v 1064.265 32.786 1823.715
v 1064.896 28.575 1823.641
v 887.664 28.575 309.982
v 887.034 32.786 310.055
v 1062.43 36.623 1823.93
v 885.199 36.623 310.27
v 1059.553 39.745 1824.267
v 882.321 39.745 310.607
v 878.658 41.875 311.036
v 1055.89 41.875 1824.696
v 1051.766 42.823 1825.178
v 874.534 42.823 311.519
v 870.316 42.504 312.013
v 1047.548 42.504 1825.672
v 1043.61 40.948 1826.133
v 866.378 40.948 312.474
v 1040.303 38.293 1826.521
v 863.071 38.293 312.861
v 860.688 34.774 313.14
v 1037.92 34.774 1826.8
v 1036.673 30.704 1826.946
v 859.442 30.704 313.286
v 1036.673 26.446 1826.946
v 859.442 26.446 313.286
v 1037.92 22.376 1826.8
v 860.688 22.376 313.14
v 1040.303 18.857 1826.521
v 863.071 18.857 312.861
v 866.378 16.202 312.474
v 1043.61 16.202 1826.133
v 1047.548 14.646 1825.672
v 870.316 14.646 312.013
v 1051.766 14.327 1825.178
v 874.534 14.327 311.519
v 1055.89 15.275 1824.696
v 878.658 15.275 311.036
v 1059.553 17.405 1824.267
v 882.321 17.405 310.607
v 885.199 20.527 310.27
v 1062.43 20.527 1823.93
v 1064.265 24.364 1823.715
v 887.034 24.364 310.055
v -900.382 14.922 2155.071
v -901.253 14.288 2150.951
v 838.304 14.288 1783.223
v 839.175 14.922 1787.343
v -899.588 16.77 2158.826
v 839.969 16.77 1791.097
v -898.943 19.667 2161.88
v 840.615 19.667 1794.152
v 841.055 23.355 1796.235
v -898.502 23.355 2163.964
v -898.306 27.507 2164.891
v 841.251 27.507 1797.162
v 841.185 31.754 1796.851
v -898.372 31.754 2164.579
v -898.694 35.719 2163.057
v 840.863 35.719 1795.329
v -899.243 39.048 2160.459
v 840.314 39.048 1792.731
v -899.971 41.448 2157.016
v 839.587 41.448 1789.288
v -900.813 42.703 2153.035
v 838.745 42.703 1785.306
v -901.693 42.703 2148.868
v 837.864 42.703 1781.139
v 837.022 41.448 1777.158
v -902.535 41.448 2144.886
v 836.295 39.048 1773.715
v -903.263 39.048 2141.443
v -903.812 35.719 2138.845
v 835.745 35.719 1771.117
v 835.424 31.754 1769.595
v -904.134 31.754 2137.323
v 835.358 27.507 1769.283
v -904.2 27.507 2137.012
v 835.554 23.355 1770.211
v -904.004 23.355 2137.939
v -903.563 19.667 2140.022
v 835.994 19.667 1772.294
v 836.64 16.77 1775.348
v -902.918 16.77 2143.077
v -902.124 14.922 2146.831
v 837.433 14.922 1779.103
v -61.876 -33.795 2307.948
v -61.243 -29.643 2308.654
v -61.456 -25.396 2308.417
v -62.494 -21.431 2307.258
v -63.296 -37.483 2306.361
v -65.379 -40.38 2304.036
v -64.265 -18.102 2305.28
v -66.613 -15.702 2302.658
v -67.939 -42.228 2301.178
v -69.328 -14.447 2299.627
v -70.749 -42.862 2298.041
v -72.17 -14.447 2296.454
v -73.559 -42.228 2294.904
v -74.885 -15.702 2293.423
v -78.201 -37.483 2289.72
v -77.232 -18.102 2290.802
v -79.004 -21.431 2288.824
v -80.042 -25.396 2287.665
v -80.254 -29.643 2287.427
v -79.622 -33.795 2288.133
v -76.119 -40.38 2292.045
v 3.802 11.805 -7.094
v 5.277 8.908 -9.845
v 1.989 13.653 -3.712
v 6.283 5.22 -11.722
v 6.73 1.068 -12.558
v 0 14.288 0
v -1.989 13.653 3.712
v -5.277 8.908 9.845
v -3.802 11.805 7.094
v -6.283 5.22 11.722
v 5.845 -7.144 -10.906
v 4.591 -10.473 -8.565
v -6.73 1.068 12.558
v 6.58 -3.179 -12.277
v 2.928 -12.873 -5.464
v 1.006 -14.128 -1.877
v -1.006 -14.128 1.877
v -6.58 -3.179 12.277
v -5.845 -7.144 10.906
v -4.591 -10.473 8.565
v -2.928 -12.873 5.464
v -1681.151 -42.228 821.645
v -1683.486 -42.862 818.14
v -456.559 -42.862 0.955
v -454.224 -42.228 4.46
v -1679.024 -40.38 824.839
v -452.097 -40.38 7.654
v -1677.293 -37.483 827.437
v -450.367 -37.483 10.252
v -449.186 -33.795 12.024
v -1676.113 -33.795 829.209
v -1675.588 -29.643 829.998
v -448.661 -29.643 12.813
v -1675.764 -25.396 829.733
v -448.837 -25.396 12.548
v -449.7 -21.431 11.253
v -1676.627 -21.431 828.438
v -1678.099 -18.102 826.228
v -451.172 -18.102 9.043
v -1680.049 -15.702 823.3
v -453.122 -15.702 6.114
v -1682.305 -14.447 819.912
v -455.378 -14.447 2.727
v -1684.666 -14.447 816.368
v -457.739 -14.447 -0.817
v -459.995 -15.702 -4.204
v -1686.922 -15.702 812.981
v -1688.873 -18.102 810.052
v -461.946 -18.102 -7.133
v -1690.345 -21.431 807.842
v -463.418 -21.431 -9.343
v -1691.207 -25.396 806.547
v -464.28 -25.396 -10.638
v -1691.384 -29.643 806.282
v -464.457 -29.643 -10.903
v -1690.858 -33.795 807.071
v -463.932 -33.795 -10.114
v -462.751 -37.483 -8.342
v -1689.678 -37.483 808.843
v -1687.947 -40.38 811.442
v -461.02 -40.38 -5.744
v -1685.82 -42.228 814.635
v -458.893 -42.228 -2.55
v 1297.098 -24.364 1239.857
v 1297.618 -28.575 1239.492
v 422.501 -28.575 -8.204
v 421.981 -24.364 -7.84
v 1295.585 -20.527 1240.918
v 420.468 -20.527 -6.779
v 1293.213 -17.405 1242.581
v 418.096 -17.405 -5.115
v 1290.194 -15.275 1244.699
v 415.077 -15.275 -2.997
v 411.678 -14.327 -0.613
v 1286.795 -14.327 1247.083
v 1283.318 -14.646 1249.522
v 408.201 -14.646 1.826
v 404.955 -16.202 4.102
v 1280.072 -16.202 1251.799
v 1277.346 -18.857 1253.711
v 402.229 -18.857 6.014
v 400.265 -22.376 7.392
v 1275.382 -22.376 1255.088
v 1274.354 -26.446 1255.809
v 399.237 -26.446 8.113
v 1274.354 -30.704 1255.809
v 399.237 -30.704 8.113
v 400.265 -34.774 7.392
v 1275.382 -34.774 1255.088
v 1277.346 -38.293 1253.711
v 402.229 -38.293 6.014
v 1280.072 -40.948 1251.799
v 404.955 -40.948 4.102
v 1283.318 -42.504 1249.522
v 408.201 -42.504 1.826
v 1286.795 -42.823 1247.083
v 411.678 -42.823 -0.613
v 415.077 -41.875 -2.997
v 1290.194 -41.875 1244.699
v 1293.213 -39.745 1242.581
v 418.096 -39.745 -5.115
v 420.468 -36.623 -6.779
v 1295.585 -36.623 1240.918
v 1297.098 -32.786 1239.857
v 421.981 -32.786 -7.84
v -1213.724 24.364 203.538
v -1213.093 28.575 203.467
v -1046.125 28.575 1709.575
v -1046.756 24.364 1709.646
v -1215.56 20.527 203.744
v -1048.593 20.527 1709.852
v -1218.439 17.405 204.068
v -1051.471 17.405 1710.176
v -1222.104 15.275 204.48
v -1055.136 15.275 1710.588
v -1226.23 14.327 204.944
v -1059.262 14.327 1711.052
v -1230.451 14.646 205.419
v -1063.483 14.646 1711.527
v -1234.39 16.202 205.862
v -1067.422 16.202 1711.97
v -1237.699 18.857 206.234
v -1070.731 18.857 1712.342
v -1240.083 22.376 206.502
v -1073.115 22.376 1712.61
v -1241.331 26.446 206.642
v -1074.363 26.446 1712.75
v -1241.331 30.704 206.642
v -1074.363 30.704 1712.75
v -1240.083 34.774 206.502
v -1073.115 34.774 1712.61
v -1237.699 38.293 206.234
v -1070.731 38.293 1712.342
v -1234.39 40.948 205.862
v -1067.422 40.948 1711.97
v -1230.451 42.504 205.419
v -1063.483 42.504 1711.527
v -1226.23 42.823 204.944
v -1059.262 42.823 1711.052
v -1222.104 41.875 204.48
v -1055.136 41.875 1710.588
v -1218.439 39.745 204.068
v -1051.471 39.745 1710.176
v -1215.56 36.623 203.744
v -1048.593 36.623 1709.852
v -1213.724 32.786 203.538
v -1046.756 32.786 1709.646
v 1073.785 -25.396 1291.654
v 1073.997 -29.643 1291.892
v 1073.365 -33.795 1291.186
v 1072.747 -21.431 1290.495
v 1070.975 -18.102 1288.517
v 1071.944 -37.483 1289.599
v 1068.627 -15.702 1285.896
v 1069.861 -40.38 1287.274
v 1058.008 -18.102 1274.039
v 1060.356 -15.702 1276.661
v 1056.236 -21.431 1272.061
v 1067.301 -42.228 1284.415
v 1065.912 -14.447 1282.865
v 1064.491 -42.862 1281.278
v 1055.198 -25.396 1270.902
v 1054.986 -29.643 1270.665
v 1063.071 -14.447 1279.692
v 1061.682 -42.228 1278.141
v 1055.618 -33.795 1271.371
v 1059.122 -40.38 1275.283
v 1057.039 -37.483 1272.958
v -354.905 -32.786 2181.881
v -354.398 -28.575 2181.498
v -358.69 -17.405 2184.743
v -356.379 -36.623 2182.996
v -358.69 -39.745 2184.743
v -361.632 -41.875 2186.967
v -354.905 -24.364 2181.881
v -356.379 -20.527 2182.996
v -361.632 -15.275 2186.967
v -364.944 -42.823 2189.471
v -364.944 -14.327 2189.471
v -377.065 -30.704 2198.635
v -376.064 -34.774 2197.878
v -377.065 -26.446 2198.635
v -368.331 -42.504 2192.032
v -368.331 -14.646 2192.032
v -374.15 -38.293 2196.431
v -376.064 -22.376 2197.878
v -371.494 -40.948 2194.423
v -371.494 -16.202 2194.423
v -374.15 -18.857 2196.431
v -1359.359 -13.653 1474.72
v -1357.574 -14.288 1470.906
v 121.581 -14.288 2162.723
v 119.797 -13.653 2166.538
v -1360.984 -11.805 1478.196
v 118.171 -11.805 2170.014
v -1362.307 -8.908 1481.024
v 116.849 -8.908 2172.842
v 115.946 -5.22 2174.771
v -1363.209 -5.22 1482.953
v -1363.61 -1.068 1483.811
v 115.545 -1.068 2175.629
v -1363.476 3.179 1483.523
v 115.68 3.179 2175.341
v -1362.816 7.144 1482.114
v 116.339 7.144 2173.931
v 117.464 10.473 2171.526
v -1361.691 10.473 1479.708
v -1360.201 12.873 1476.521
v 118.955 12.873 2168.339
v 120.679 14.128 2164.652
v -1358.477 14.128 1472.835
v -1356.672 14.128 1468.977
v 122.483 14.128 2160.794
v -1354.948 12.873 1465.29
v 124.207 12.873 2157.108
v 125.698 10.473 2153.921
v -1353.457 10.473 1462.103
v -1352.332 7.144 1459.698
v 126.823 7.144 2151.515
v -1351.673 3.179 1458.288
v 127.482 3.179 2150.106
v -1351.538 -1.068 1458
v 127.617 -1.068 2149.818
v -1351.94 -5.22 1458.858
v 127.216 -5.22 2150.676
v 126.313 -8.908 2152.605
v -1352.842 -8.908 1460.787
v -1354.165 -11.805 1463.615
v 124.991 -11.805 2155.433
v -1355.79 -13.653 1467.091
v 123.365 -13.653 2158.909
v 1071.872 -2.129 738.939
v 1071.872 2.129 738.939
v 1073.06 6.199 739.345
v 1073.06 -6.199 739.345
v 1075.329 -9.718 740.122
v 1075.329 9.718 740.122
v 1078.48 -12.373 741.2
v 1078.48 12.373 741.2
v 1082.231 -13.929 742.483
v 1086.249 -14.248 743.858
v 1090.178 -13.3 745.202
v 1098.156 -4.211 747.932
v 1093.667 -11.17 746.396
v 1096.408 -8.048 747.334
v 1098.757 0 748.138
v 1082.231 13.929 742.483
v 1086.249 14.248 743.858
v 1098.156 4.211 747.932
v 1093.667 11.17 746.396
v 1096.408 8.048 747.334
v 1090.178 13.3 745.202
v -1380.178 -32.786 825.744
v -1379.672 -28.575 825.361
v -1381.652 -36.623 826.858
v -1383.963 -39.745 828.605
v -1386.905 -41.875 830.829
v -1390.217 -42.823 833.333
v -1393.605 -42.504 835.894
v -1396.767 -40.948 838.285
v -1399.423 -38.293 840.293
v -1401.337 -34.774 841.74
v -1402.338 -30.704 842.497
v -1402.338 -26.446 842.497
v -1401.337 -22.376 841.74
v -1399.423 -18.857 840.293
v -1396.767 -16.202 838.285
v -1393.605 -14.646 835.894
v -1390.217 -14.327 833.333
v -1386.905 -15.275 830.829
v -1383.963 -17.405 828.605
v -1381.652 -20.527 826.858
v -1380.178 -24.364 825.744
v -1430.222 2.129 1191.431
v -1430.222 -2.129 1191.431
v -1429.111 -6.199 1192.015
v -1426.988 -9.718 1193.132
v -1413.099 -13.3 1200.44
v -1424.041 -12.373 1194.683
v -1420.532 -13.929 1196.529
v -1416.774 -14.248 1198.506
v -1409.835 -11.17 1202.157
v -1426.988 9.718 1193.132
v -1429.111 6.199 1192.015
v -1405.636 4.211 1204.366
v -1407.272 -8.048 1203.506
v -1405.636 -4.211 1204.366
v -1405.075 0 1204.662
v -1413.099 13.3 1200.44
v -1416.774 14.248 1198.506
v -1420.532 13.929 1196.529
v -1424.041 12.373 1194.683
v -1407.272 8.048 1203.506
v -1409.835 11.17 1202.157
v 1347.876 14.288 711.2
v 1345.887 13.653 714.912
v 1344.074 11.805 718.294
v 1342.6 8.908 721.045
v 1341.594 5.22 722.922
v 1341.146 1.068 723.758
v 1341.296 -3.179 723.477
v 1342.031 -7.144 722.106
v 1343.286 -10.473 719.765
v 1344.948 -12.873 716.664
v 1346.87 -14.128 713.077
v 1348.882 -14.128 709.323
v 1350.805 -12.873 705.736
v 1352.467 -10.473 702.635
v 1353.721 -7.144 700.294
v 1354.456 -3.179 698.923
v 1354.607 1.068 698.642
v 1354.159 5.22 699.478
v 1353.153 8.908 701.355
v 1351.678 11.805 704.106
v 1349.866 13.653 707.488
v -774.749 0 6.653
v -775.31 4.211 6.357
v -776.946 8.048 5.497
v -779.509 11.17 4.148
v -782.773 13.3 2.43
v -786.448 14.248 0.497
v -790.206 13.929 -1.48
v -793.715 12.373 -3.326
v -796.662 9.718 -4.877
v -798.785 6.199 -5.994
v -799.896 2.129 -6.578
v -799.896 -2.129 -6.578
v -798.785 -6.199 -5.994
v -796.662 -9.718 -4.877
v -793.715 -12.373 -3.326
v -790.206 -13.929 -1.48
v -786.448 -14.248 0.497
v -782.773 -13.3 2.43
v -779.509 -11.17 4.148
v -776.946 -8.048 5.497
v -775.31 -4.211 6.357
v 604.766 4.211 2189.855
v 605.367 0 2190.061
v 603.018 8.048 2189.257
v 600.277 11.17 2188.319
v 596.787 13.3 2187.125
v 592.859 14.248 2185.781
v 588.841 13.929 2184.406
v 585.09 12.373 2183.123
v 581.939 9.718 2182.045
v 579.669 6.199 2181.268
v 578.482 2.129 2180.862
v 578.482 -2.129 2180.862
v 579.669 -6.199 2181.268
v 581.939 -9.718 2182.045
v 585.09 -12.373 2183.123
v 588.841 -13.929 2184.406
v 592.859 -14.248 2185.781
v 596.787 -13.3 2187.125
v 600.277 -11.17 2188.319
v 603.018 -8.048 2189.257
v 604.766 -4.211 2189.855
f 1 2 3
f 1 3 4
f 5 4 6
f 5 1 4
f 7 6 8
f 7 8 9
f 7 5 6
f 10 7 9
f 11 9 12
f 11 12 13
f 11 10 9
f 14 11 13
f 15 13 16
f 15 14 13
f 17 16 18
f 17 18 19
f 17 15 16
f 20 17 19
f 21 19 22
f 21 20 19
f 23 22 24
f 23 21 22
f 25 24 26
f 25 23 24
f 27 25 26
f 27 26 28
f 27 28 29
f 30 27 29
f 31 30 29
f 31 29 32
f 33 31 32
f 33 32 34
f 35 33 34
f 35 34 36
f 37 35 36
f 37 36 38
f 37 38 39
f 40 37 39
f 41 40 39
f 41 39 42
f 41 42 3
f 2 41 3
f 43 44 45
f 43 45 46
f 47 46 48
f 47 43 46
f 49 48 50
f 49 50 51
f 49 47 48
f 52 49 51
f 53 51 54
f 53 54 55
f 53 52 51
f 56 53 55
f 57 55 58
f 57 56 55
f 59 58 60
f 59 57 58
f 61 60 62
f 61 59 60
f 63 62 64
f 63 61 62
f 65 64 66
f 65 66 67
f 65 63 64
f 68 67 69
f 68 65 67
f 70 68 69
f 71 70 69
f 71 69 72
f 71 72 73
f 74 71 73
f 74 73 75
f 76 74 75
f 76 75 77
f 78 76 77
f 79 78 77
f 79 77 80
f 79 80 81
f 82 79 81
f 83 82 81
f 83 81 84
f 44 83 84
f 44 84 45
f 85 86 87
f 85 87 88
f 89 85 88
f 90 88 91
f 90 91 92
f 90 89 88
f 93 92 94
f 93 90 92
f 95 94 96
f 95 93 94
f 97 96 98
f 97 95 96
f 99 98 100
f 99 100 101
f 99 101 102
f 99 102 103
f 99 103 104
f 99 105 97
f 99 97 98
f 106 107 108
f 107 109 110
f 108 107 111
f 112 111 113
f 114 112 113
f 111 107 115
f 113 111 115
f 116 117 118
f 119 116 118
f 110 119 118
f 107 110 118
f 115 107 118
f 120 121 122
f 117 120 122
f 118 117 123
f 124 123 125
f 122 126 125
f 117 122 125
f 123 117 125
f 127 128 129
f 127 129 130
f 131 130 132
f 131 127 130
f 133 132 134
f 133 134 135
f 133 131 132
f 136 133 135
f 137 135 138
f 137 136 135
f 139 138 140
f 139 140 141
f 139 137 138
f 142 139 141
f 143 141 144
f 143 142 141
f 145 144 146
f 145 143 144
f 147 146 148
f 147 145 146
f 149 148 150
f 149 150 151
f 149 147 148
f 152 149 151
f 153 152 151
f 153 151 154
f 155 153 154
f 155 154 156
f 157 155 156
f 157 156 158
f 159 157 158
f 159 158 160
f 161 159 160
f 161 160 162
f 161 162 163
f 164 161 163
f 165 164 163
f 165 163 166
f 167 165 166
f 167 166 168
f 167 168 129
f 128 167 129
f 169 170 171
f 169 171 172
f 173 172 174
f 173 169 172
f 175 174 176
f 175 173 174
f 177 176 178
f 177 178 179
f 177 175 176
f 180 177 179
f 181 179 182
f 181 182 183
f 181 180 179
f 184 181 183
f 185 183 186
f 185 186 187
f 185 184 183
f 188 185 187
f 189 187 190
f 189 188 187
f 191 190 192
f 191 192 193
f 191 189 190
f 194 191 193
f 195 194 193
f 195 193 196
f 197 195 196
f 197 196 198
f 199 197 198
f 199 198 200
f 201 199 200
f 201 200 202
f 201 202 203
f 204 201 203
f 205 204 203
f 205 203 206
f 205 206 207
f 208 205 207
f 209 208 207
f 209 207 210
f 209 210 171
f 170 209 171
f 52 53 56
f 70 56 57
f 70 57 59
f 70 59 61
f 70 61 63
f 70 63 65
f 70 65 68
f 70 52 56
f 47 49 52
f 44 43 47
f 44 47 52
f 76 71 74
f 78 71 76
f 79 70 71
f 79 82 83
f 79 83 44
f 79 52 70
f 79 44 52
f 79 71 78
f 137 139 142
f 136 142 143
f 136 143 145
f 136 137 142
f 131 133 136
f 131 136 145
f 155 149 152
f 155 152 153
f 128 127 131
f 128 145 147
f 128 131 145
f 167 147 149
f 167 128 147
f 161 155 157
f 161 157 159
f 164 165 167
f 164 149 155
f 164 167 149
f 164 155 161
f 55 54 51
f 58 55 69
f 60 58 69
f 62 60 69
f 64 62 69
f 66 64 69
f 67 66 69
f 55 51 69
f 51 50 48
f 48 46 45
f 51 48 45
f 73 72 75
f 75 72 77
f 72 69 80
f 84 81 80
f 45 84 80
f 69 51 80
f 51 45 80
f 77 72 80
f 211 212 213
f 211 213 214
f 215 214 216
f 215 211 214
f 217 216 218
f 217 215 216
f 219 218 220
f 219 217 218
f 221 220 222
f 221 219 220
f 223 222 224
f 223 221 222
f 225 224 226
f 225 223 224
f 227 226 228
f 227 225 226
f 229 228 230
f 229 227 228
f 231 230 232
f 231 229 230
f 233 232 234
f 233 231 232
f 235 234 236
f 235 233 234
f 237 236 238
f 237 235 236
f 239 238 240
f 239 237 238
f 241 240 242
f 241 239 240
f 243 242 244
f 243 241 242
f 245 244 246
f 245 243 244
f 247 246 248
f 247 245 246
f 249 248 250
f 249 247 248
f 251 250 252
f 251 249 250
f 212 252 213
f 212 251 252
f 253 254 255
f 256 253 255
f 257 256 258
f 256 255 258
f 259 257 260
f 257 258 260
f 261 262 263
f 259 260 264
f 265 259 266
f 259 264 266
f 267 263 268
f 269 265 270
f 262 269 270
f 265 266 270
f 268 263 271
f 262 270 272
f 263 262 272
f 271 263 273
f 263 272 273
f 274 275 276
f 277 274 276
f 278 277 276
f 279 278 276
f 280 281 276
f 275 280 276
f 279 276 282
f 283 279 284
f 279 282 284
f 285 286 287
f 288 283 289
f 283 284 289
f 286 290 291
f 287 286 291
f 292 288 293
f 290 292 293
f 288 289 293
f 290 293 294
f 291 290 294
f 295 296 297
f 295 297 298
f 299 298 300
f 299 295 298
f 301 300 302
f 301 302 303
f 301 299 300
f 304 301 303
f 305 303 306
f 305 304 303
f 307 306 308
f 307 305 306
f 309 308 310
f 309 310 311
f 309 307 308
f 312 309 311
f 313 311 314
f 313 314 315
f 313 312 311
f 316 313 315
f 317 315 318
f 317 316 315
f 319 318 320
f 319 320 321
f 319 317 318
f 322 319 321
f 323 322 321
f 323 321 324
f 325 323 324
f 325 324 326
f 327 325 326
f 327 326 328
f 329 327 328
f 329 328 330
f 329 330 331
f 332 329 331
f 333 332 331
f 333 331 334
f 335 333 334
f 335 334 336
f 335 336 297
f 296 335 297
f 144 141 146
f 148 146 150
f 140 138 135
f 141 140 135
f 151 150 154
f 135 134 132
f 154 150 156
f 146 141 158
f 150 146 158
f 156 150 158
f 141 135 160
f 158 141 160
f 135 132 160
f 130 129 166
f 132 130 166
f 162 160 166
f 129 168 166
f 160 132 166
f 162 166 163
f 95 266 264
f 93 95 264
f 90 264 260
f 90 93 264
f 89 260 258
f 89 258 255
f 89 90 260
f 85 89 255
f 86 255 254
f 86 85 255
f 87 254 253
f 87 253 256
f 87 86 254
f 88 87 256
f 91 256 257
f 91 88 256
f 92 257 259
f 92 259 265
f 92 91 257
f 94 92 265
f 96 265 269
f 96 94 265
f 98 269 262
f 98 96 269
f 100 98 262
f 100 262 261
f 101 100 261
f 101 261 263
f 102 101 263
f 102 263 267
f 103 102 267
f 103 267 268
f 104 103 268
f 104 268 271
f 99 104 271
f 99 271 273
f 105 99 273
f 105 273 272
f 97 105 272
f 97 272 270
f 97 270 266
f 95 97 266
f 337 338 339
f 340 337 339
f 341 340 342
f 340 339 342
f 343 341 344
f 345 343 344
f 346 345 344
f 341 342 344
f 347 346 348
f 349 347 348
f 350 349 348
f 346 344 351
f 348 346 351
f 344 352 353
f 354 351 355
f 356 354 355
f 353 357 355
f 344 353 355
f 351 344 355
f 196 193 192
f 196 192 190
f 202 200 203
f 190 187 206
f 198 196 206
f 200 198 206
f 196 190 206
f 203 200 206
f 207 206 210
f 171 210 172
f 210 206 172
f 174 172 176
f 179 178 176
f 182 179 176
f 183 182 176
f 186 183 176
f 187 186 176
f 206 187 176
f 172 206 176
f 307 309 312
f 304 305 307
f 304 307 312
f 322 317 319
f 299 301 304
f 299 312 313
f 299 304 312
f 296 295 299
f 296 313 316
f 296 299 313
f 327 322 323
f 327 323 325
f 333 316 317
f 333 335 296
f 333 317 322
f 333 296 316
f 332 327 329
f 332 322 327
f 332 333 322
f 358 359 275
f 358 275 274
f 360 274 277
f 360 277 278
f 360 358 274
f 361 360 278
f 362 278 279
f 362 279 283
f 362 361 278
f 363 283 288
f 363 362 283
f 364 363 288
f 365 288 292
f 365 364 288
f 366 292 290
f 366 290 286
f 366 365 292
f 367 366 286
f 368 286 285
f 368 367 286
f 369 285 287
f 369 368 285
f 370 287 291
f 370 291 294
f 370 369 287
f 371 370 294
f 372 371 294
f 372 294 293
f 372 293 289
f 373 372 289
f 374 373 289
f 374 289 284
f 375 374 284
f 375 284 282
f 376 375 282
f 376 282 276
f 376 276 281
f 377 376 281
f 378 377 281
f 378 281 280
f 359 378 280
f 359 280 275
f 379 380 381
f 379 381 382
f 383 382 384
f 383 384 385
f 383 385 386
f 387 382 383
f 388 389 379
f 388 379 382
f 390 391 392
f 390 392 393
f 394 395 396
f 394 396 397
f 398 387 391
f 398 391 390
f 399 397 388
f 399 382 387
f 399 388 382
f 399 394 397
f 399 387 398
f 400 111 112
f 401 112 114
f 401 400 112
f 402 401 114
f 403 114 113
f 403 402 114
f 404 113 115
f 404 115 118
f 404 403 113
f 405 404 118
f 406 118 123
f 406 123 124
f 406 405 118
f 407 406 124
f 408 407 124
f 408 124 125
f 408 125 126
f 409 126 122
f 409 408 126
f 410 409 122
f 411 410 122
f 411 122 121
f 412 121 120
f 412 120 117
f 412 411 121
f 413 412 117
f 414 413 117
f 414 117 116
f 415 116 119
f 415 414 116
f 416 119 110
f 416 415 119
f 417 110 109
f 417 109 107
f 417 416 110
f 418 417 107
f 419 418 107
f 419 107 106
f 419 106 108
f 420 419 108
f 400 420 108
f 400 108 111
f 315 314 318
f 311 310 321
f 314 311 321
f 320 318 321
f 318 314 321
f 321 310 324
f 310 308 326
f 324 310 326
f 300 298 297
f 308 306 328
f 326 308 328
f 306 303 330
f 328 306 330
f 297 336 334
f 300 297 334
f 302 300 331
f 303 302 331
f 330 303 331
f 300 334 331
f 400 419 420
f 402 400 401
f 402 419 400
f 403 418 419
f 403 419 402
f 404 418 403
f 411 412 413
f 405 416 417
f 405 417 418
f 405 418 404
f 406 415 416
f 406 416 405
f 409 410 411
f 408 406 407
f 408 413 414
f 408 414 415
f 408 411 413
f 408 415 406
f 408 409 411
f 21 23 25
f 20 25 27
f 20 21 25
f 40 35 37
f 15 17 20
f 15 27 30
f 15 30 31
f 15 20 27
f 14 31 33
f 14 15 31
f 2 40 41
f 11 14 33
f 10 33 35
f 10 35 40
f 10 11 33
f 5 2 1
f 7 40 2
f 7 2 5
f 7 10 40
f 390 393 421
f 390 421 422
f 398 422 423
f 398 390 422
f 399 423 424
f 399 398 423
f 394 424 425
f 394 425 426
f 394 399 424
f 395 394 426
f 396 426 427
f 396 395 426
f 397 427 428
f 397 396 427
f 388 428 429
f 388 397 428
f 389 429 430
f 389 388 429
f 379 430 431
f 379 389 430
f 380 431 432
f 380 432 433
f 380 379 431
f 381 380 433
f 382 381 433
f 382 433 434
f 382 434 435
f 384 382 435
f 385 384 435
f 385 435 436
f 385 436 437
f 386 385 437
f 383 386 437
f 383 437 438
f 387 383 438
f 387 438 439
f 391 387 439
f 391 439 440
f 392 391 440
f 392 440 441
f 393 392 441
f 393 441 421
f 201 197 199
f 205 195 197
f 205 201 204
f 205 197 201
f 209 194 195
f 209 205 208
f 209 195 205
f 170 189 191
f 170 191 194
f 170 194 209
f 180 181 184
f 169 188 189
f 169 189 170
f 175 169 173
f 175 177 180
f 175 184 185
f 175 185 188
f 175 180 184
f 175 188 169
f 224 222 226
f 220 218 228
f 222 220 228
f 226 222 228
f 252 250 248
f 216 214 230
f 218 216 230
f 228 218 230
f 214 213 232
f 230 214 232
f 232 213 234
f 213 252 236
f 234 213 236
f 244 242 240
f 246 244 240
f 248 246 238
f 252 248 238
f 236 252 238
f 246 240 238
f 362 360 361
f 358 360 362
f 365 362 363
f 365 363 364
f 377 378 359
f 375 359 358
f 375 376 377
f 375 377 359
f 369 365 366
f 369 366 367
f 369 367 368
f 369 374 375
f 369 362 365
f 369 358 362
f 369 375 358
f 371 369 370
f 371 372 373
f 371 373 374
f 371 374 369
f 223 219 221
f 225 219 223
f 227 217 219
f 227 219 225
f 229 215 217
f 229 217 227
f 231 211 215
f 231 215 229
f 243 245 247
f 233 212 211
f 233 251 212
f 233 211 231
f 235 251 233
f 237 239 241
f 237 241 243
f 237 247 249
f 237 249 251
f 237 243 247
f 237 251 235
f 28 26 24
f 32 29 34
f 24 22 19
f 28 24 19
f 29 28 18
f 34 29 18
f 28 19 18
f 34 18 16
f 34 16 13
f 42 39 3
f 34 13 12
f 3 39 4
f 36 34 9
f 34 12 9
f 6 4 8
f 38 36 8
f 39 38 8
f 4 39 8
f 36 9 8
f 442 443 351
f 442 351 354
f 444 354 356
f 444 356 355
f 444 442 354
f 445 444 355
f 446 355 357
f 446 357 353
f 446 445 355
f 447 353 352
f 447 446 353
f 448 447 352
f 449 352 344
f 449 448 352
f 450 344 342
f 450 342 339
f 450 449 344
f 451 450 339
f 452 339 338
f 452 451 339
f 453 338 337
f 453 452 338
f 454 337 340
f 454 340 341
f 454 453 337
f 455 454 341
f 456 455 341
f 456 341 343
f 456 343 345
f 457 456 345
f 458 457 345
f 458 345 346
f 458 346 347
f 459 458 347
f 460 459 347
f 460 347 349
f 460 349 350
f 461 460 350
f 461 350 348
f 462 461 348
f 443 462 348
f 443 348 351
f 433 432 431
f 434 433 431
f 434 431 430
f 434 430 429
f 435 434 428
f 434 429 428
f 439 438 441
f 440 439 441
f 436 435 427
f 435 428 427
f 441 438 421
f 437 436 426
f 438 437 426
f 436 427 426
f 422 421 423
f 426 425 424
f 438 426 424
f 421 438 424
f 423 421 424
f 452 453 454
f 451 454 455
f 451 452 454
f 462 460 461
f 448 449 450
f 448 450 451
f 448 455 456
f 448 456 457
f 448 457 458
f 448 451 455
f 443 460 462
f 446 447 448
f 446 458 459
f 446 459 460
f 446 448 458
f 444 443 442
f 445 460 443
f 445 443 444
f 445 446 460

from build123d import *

# Parameters (mm, degrees)
F3_R  = 14.2875
F9_R  = 14.2875
F13_R = 14.2875
F17_R = 14.2875
F21_R = 14.2875
F25_R = 14.2875
F29_R = 14.2875
F33_R = 14.2875
F37_R = 14.2875
F41_R = 14.2875
F45_R = 14.2875


with BuildPart() as f4:
    # F4: sweep along a path in F0
    with BuildLine(Plane.XZ) as f4_path:
        Line((0, 0), (1347.8763148004, 711.2))
    # F3 (on line) → F4 (sweep)
    with BuildSketch(Plane(origin=(0, 0, 0), x_dir=(0, 1, 0), z_dir=(0.8813902642, 0, 0.4723888252))):
        Circle(F3_R)
    sweep(path=f4_path.line)


with BuildPart() as f10:
    # F10: sweep along a path in F7
    with BuildLine(Plane.XZ.offset(28.575)) as f10_path:
        Line((410.8034395753, 0), (1285.9203914789, 1247.6964055774))
    # F9 (on line) → F10 (sweep)
    with BuildSketch(Plane(origin=(135.4554023081, 0, 193.1252939487), x_dir=(0.8186984289, 0, -0.5742237217), z_dir=(0.5742237217, 0, 0.8186984289))):
        with Locations((336.3241305492, -28.575)):
            Circle(F9_R)
    sweep(path=f10_path.line)


with BuildPart() as f14:
    # F14: sweep along a path in F11
    with BuildLine(Plane.XZ.offset(-28.575)) as f14_path:
        Line((873.4737293956, 311.6431001729), (1050.7052881482, 1825.3025647098))
    # F13 (on line) → F14 (sweep)
    with BuildSketch(Plane(origin=(47.809263182, 0, 408.3186099438), x_dir=(0.9932148717, 0, -0.1162936737), z_dir=(0.1162936737, 0, 0.9932148717))):
        with Locations((831.3049771036, 28.575)):
            Circle(F13_R)
    sweep(path=f14_path.line)


with BuildPart() as f18:
    # F18: sweep along a path in F15
    with BuildLine(Plane.XZ) as f18_path:
        Line((1085.2388725713, 743.5123834057), (591.8486132189, 2185.4354229526))
    # F17 (on line) → F18 (sweep)
    with BuildSketch(Plane(origin=(-113.9999782084, 0, 333.1626272928), x_dir=(0.9461437267, 0, 0.3237468893), z_dir=(-0.3237468893, 0, 0.9461437267))):
        with Locations((1267.5017726068, 0)):
            Circle(F17_R)
    sweep(path=f18_path.line)


with BuildPart() as f22:
    # F22: sweep along a path in F19
    with BuildLine(Plane.XZ.offset(28.575)) as f22_path:
        Line((1064.491485627, 1281.2784468634), (-70.7489376977, 2298.0405533808))
    # F21 (on line) → F22 (sweep)
    with BuildSketch(Plane(origin=(-46.0932160119, 0, 41.282740154), x_dir=(0, -1, 0), z_dir=(-0.7449084143, 0, 0.6671667366))):
        with Locations((28.575, 1664.6284066338)):
            Circle(F21_R)
    sweep(path=f22_path.line)


with BuildPart() as f26:
    # F26: sweep along a path in F23
    with BuildLine(Plane.XZ.offset(-28.575)) as f26_path:
        Line((838.3043938221, 1783.2228974534), (-901.2529899708, 2150.9512054357))
    # F25 (on line) → F26 (sweep)
    with BuildSketch(Plane(origin=(441.6114677704, 0, -93.3530789738), x_dir=(0, -1, 0), z_dir=(-0.978378731, 0, 0.2068213206))):
        with Locations((-28.575, 1918.0465773498)):
            Circle(F25_R)
    sweep(path=f26_path.line)


with BuildPart() as f30:
    # F30: sweep along a path in F27
    with BuildLine(Plane.XZ) as f30_path:
        Line((121.5810066726, 2162.7233696814), (-1357.5743436813, 1470.9056615829))
    # F29 (on line) → F30 (sweep)
    with BuildSketch(Plane(origin=(929.7293196071, 0, 434.844931527), x_dir=(0, -1, 0), z_dir=(-0.9058201843, 0, -0.4236623582))):
        with Locations((0, 1907.5291852912)):
            Circle(F29_R)
    sweep(path=f30_path.line)


with BuildPart() as f34:
    # F34: sweep along a path in F31
    with BuildLine(Plane.XZ.offset(28.575)) as f34_path:
        Line((-365.7954335213, 2190.114736557), (-1391.0686969757, 833.9771032333))
    # F33 (on line) → F34 (sweep)
    with BuildSketch(Plane(origin=(920.5436499964, 0, 1217.6108861662), x_dir=(0.797687371, 0, -0.6030711883), z_dir=(-0.6030711883, 0, -0.797687371))):
        with Locations((-1612.5854944188, 28.575)):
            Circle(F33_R)
    sweep(path=f34_path.line)


with BuildPart() as f38:
    # F38: sweep along a path in F35
    with BuildLine(Plane.XZ.offset(-28.575)) as f38_path:
        Line((-1060.3234767914, 1711.1713886261), (-1227.291226387, 205.0634771585))
    # F37 (on line) → F38 (sweep)
    with BuildSketch(Plane(origin=(176.7777317095, 0, 1572.0596539092), x_dir=(0.9937368613, 0, -0.1117454721), z_dir=(-0.1117454721, 0, -0.9937368613))):
        with Locations((-1244.898178491, -28.575)):
            Circle(F37_R)
    sweep(path=f38_path.line)


with BuildPart() as f42:
    # F42: sweep along a path in F39
    with BuildLine(Plane.XZ) as f42_path:
        Line((-787.3926758766, 0), (-1417.7188873291, 1198.0091333389))
    # F41 (on line) → F42 (sweep)
    with BuildSketch(Plane(origin=(-801.040294303, 0, 1522.4713351776), x_dir=(0.8849806012, 0, 0.4656278938), z_dir=(-0.4656278938, 0, 0.8849806012))):
        with Locations((-696.8272436685, 0)):
            Circle(F41_R)
    sweep(path=f42_path.line)


with BuildPart() as f46:
    # F46: sweep along a path in F43
    with BuildLine(Plane.XZ.offset(28.575)) as f46_path:
        Line((-455.1250636578, 0), (-1682.051897049, 817.1851634979))
    # F45 (on line) → F46 (sweep)
    with BuildSketch(Plane(origin=(-1543.6288496995, 0, 1028.122101165), x_dir=(0, -1, 0), z_dir=(-0.832290059, 0, 0.5543403807))):
        with Locations((28.575, -252.2942010634)):
            Circle(F45_R)
    sweep(path=f46_path.line)


solid = Compound([f4.part, f10.part, f14.part, f18.part, f22.part, f26.part, f30.part, f34.part, f38.part, f42.part, f46.part])
